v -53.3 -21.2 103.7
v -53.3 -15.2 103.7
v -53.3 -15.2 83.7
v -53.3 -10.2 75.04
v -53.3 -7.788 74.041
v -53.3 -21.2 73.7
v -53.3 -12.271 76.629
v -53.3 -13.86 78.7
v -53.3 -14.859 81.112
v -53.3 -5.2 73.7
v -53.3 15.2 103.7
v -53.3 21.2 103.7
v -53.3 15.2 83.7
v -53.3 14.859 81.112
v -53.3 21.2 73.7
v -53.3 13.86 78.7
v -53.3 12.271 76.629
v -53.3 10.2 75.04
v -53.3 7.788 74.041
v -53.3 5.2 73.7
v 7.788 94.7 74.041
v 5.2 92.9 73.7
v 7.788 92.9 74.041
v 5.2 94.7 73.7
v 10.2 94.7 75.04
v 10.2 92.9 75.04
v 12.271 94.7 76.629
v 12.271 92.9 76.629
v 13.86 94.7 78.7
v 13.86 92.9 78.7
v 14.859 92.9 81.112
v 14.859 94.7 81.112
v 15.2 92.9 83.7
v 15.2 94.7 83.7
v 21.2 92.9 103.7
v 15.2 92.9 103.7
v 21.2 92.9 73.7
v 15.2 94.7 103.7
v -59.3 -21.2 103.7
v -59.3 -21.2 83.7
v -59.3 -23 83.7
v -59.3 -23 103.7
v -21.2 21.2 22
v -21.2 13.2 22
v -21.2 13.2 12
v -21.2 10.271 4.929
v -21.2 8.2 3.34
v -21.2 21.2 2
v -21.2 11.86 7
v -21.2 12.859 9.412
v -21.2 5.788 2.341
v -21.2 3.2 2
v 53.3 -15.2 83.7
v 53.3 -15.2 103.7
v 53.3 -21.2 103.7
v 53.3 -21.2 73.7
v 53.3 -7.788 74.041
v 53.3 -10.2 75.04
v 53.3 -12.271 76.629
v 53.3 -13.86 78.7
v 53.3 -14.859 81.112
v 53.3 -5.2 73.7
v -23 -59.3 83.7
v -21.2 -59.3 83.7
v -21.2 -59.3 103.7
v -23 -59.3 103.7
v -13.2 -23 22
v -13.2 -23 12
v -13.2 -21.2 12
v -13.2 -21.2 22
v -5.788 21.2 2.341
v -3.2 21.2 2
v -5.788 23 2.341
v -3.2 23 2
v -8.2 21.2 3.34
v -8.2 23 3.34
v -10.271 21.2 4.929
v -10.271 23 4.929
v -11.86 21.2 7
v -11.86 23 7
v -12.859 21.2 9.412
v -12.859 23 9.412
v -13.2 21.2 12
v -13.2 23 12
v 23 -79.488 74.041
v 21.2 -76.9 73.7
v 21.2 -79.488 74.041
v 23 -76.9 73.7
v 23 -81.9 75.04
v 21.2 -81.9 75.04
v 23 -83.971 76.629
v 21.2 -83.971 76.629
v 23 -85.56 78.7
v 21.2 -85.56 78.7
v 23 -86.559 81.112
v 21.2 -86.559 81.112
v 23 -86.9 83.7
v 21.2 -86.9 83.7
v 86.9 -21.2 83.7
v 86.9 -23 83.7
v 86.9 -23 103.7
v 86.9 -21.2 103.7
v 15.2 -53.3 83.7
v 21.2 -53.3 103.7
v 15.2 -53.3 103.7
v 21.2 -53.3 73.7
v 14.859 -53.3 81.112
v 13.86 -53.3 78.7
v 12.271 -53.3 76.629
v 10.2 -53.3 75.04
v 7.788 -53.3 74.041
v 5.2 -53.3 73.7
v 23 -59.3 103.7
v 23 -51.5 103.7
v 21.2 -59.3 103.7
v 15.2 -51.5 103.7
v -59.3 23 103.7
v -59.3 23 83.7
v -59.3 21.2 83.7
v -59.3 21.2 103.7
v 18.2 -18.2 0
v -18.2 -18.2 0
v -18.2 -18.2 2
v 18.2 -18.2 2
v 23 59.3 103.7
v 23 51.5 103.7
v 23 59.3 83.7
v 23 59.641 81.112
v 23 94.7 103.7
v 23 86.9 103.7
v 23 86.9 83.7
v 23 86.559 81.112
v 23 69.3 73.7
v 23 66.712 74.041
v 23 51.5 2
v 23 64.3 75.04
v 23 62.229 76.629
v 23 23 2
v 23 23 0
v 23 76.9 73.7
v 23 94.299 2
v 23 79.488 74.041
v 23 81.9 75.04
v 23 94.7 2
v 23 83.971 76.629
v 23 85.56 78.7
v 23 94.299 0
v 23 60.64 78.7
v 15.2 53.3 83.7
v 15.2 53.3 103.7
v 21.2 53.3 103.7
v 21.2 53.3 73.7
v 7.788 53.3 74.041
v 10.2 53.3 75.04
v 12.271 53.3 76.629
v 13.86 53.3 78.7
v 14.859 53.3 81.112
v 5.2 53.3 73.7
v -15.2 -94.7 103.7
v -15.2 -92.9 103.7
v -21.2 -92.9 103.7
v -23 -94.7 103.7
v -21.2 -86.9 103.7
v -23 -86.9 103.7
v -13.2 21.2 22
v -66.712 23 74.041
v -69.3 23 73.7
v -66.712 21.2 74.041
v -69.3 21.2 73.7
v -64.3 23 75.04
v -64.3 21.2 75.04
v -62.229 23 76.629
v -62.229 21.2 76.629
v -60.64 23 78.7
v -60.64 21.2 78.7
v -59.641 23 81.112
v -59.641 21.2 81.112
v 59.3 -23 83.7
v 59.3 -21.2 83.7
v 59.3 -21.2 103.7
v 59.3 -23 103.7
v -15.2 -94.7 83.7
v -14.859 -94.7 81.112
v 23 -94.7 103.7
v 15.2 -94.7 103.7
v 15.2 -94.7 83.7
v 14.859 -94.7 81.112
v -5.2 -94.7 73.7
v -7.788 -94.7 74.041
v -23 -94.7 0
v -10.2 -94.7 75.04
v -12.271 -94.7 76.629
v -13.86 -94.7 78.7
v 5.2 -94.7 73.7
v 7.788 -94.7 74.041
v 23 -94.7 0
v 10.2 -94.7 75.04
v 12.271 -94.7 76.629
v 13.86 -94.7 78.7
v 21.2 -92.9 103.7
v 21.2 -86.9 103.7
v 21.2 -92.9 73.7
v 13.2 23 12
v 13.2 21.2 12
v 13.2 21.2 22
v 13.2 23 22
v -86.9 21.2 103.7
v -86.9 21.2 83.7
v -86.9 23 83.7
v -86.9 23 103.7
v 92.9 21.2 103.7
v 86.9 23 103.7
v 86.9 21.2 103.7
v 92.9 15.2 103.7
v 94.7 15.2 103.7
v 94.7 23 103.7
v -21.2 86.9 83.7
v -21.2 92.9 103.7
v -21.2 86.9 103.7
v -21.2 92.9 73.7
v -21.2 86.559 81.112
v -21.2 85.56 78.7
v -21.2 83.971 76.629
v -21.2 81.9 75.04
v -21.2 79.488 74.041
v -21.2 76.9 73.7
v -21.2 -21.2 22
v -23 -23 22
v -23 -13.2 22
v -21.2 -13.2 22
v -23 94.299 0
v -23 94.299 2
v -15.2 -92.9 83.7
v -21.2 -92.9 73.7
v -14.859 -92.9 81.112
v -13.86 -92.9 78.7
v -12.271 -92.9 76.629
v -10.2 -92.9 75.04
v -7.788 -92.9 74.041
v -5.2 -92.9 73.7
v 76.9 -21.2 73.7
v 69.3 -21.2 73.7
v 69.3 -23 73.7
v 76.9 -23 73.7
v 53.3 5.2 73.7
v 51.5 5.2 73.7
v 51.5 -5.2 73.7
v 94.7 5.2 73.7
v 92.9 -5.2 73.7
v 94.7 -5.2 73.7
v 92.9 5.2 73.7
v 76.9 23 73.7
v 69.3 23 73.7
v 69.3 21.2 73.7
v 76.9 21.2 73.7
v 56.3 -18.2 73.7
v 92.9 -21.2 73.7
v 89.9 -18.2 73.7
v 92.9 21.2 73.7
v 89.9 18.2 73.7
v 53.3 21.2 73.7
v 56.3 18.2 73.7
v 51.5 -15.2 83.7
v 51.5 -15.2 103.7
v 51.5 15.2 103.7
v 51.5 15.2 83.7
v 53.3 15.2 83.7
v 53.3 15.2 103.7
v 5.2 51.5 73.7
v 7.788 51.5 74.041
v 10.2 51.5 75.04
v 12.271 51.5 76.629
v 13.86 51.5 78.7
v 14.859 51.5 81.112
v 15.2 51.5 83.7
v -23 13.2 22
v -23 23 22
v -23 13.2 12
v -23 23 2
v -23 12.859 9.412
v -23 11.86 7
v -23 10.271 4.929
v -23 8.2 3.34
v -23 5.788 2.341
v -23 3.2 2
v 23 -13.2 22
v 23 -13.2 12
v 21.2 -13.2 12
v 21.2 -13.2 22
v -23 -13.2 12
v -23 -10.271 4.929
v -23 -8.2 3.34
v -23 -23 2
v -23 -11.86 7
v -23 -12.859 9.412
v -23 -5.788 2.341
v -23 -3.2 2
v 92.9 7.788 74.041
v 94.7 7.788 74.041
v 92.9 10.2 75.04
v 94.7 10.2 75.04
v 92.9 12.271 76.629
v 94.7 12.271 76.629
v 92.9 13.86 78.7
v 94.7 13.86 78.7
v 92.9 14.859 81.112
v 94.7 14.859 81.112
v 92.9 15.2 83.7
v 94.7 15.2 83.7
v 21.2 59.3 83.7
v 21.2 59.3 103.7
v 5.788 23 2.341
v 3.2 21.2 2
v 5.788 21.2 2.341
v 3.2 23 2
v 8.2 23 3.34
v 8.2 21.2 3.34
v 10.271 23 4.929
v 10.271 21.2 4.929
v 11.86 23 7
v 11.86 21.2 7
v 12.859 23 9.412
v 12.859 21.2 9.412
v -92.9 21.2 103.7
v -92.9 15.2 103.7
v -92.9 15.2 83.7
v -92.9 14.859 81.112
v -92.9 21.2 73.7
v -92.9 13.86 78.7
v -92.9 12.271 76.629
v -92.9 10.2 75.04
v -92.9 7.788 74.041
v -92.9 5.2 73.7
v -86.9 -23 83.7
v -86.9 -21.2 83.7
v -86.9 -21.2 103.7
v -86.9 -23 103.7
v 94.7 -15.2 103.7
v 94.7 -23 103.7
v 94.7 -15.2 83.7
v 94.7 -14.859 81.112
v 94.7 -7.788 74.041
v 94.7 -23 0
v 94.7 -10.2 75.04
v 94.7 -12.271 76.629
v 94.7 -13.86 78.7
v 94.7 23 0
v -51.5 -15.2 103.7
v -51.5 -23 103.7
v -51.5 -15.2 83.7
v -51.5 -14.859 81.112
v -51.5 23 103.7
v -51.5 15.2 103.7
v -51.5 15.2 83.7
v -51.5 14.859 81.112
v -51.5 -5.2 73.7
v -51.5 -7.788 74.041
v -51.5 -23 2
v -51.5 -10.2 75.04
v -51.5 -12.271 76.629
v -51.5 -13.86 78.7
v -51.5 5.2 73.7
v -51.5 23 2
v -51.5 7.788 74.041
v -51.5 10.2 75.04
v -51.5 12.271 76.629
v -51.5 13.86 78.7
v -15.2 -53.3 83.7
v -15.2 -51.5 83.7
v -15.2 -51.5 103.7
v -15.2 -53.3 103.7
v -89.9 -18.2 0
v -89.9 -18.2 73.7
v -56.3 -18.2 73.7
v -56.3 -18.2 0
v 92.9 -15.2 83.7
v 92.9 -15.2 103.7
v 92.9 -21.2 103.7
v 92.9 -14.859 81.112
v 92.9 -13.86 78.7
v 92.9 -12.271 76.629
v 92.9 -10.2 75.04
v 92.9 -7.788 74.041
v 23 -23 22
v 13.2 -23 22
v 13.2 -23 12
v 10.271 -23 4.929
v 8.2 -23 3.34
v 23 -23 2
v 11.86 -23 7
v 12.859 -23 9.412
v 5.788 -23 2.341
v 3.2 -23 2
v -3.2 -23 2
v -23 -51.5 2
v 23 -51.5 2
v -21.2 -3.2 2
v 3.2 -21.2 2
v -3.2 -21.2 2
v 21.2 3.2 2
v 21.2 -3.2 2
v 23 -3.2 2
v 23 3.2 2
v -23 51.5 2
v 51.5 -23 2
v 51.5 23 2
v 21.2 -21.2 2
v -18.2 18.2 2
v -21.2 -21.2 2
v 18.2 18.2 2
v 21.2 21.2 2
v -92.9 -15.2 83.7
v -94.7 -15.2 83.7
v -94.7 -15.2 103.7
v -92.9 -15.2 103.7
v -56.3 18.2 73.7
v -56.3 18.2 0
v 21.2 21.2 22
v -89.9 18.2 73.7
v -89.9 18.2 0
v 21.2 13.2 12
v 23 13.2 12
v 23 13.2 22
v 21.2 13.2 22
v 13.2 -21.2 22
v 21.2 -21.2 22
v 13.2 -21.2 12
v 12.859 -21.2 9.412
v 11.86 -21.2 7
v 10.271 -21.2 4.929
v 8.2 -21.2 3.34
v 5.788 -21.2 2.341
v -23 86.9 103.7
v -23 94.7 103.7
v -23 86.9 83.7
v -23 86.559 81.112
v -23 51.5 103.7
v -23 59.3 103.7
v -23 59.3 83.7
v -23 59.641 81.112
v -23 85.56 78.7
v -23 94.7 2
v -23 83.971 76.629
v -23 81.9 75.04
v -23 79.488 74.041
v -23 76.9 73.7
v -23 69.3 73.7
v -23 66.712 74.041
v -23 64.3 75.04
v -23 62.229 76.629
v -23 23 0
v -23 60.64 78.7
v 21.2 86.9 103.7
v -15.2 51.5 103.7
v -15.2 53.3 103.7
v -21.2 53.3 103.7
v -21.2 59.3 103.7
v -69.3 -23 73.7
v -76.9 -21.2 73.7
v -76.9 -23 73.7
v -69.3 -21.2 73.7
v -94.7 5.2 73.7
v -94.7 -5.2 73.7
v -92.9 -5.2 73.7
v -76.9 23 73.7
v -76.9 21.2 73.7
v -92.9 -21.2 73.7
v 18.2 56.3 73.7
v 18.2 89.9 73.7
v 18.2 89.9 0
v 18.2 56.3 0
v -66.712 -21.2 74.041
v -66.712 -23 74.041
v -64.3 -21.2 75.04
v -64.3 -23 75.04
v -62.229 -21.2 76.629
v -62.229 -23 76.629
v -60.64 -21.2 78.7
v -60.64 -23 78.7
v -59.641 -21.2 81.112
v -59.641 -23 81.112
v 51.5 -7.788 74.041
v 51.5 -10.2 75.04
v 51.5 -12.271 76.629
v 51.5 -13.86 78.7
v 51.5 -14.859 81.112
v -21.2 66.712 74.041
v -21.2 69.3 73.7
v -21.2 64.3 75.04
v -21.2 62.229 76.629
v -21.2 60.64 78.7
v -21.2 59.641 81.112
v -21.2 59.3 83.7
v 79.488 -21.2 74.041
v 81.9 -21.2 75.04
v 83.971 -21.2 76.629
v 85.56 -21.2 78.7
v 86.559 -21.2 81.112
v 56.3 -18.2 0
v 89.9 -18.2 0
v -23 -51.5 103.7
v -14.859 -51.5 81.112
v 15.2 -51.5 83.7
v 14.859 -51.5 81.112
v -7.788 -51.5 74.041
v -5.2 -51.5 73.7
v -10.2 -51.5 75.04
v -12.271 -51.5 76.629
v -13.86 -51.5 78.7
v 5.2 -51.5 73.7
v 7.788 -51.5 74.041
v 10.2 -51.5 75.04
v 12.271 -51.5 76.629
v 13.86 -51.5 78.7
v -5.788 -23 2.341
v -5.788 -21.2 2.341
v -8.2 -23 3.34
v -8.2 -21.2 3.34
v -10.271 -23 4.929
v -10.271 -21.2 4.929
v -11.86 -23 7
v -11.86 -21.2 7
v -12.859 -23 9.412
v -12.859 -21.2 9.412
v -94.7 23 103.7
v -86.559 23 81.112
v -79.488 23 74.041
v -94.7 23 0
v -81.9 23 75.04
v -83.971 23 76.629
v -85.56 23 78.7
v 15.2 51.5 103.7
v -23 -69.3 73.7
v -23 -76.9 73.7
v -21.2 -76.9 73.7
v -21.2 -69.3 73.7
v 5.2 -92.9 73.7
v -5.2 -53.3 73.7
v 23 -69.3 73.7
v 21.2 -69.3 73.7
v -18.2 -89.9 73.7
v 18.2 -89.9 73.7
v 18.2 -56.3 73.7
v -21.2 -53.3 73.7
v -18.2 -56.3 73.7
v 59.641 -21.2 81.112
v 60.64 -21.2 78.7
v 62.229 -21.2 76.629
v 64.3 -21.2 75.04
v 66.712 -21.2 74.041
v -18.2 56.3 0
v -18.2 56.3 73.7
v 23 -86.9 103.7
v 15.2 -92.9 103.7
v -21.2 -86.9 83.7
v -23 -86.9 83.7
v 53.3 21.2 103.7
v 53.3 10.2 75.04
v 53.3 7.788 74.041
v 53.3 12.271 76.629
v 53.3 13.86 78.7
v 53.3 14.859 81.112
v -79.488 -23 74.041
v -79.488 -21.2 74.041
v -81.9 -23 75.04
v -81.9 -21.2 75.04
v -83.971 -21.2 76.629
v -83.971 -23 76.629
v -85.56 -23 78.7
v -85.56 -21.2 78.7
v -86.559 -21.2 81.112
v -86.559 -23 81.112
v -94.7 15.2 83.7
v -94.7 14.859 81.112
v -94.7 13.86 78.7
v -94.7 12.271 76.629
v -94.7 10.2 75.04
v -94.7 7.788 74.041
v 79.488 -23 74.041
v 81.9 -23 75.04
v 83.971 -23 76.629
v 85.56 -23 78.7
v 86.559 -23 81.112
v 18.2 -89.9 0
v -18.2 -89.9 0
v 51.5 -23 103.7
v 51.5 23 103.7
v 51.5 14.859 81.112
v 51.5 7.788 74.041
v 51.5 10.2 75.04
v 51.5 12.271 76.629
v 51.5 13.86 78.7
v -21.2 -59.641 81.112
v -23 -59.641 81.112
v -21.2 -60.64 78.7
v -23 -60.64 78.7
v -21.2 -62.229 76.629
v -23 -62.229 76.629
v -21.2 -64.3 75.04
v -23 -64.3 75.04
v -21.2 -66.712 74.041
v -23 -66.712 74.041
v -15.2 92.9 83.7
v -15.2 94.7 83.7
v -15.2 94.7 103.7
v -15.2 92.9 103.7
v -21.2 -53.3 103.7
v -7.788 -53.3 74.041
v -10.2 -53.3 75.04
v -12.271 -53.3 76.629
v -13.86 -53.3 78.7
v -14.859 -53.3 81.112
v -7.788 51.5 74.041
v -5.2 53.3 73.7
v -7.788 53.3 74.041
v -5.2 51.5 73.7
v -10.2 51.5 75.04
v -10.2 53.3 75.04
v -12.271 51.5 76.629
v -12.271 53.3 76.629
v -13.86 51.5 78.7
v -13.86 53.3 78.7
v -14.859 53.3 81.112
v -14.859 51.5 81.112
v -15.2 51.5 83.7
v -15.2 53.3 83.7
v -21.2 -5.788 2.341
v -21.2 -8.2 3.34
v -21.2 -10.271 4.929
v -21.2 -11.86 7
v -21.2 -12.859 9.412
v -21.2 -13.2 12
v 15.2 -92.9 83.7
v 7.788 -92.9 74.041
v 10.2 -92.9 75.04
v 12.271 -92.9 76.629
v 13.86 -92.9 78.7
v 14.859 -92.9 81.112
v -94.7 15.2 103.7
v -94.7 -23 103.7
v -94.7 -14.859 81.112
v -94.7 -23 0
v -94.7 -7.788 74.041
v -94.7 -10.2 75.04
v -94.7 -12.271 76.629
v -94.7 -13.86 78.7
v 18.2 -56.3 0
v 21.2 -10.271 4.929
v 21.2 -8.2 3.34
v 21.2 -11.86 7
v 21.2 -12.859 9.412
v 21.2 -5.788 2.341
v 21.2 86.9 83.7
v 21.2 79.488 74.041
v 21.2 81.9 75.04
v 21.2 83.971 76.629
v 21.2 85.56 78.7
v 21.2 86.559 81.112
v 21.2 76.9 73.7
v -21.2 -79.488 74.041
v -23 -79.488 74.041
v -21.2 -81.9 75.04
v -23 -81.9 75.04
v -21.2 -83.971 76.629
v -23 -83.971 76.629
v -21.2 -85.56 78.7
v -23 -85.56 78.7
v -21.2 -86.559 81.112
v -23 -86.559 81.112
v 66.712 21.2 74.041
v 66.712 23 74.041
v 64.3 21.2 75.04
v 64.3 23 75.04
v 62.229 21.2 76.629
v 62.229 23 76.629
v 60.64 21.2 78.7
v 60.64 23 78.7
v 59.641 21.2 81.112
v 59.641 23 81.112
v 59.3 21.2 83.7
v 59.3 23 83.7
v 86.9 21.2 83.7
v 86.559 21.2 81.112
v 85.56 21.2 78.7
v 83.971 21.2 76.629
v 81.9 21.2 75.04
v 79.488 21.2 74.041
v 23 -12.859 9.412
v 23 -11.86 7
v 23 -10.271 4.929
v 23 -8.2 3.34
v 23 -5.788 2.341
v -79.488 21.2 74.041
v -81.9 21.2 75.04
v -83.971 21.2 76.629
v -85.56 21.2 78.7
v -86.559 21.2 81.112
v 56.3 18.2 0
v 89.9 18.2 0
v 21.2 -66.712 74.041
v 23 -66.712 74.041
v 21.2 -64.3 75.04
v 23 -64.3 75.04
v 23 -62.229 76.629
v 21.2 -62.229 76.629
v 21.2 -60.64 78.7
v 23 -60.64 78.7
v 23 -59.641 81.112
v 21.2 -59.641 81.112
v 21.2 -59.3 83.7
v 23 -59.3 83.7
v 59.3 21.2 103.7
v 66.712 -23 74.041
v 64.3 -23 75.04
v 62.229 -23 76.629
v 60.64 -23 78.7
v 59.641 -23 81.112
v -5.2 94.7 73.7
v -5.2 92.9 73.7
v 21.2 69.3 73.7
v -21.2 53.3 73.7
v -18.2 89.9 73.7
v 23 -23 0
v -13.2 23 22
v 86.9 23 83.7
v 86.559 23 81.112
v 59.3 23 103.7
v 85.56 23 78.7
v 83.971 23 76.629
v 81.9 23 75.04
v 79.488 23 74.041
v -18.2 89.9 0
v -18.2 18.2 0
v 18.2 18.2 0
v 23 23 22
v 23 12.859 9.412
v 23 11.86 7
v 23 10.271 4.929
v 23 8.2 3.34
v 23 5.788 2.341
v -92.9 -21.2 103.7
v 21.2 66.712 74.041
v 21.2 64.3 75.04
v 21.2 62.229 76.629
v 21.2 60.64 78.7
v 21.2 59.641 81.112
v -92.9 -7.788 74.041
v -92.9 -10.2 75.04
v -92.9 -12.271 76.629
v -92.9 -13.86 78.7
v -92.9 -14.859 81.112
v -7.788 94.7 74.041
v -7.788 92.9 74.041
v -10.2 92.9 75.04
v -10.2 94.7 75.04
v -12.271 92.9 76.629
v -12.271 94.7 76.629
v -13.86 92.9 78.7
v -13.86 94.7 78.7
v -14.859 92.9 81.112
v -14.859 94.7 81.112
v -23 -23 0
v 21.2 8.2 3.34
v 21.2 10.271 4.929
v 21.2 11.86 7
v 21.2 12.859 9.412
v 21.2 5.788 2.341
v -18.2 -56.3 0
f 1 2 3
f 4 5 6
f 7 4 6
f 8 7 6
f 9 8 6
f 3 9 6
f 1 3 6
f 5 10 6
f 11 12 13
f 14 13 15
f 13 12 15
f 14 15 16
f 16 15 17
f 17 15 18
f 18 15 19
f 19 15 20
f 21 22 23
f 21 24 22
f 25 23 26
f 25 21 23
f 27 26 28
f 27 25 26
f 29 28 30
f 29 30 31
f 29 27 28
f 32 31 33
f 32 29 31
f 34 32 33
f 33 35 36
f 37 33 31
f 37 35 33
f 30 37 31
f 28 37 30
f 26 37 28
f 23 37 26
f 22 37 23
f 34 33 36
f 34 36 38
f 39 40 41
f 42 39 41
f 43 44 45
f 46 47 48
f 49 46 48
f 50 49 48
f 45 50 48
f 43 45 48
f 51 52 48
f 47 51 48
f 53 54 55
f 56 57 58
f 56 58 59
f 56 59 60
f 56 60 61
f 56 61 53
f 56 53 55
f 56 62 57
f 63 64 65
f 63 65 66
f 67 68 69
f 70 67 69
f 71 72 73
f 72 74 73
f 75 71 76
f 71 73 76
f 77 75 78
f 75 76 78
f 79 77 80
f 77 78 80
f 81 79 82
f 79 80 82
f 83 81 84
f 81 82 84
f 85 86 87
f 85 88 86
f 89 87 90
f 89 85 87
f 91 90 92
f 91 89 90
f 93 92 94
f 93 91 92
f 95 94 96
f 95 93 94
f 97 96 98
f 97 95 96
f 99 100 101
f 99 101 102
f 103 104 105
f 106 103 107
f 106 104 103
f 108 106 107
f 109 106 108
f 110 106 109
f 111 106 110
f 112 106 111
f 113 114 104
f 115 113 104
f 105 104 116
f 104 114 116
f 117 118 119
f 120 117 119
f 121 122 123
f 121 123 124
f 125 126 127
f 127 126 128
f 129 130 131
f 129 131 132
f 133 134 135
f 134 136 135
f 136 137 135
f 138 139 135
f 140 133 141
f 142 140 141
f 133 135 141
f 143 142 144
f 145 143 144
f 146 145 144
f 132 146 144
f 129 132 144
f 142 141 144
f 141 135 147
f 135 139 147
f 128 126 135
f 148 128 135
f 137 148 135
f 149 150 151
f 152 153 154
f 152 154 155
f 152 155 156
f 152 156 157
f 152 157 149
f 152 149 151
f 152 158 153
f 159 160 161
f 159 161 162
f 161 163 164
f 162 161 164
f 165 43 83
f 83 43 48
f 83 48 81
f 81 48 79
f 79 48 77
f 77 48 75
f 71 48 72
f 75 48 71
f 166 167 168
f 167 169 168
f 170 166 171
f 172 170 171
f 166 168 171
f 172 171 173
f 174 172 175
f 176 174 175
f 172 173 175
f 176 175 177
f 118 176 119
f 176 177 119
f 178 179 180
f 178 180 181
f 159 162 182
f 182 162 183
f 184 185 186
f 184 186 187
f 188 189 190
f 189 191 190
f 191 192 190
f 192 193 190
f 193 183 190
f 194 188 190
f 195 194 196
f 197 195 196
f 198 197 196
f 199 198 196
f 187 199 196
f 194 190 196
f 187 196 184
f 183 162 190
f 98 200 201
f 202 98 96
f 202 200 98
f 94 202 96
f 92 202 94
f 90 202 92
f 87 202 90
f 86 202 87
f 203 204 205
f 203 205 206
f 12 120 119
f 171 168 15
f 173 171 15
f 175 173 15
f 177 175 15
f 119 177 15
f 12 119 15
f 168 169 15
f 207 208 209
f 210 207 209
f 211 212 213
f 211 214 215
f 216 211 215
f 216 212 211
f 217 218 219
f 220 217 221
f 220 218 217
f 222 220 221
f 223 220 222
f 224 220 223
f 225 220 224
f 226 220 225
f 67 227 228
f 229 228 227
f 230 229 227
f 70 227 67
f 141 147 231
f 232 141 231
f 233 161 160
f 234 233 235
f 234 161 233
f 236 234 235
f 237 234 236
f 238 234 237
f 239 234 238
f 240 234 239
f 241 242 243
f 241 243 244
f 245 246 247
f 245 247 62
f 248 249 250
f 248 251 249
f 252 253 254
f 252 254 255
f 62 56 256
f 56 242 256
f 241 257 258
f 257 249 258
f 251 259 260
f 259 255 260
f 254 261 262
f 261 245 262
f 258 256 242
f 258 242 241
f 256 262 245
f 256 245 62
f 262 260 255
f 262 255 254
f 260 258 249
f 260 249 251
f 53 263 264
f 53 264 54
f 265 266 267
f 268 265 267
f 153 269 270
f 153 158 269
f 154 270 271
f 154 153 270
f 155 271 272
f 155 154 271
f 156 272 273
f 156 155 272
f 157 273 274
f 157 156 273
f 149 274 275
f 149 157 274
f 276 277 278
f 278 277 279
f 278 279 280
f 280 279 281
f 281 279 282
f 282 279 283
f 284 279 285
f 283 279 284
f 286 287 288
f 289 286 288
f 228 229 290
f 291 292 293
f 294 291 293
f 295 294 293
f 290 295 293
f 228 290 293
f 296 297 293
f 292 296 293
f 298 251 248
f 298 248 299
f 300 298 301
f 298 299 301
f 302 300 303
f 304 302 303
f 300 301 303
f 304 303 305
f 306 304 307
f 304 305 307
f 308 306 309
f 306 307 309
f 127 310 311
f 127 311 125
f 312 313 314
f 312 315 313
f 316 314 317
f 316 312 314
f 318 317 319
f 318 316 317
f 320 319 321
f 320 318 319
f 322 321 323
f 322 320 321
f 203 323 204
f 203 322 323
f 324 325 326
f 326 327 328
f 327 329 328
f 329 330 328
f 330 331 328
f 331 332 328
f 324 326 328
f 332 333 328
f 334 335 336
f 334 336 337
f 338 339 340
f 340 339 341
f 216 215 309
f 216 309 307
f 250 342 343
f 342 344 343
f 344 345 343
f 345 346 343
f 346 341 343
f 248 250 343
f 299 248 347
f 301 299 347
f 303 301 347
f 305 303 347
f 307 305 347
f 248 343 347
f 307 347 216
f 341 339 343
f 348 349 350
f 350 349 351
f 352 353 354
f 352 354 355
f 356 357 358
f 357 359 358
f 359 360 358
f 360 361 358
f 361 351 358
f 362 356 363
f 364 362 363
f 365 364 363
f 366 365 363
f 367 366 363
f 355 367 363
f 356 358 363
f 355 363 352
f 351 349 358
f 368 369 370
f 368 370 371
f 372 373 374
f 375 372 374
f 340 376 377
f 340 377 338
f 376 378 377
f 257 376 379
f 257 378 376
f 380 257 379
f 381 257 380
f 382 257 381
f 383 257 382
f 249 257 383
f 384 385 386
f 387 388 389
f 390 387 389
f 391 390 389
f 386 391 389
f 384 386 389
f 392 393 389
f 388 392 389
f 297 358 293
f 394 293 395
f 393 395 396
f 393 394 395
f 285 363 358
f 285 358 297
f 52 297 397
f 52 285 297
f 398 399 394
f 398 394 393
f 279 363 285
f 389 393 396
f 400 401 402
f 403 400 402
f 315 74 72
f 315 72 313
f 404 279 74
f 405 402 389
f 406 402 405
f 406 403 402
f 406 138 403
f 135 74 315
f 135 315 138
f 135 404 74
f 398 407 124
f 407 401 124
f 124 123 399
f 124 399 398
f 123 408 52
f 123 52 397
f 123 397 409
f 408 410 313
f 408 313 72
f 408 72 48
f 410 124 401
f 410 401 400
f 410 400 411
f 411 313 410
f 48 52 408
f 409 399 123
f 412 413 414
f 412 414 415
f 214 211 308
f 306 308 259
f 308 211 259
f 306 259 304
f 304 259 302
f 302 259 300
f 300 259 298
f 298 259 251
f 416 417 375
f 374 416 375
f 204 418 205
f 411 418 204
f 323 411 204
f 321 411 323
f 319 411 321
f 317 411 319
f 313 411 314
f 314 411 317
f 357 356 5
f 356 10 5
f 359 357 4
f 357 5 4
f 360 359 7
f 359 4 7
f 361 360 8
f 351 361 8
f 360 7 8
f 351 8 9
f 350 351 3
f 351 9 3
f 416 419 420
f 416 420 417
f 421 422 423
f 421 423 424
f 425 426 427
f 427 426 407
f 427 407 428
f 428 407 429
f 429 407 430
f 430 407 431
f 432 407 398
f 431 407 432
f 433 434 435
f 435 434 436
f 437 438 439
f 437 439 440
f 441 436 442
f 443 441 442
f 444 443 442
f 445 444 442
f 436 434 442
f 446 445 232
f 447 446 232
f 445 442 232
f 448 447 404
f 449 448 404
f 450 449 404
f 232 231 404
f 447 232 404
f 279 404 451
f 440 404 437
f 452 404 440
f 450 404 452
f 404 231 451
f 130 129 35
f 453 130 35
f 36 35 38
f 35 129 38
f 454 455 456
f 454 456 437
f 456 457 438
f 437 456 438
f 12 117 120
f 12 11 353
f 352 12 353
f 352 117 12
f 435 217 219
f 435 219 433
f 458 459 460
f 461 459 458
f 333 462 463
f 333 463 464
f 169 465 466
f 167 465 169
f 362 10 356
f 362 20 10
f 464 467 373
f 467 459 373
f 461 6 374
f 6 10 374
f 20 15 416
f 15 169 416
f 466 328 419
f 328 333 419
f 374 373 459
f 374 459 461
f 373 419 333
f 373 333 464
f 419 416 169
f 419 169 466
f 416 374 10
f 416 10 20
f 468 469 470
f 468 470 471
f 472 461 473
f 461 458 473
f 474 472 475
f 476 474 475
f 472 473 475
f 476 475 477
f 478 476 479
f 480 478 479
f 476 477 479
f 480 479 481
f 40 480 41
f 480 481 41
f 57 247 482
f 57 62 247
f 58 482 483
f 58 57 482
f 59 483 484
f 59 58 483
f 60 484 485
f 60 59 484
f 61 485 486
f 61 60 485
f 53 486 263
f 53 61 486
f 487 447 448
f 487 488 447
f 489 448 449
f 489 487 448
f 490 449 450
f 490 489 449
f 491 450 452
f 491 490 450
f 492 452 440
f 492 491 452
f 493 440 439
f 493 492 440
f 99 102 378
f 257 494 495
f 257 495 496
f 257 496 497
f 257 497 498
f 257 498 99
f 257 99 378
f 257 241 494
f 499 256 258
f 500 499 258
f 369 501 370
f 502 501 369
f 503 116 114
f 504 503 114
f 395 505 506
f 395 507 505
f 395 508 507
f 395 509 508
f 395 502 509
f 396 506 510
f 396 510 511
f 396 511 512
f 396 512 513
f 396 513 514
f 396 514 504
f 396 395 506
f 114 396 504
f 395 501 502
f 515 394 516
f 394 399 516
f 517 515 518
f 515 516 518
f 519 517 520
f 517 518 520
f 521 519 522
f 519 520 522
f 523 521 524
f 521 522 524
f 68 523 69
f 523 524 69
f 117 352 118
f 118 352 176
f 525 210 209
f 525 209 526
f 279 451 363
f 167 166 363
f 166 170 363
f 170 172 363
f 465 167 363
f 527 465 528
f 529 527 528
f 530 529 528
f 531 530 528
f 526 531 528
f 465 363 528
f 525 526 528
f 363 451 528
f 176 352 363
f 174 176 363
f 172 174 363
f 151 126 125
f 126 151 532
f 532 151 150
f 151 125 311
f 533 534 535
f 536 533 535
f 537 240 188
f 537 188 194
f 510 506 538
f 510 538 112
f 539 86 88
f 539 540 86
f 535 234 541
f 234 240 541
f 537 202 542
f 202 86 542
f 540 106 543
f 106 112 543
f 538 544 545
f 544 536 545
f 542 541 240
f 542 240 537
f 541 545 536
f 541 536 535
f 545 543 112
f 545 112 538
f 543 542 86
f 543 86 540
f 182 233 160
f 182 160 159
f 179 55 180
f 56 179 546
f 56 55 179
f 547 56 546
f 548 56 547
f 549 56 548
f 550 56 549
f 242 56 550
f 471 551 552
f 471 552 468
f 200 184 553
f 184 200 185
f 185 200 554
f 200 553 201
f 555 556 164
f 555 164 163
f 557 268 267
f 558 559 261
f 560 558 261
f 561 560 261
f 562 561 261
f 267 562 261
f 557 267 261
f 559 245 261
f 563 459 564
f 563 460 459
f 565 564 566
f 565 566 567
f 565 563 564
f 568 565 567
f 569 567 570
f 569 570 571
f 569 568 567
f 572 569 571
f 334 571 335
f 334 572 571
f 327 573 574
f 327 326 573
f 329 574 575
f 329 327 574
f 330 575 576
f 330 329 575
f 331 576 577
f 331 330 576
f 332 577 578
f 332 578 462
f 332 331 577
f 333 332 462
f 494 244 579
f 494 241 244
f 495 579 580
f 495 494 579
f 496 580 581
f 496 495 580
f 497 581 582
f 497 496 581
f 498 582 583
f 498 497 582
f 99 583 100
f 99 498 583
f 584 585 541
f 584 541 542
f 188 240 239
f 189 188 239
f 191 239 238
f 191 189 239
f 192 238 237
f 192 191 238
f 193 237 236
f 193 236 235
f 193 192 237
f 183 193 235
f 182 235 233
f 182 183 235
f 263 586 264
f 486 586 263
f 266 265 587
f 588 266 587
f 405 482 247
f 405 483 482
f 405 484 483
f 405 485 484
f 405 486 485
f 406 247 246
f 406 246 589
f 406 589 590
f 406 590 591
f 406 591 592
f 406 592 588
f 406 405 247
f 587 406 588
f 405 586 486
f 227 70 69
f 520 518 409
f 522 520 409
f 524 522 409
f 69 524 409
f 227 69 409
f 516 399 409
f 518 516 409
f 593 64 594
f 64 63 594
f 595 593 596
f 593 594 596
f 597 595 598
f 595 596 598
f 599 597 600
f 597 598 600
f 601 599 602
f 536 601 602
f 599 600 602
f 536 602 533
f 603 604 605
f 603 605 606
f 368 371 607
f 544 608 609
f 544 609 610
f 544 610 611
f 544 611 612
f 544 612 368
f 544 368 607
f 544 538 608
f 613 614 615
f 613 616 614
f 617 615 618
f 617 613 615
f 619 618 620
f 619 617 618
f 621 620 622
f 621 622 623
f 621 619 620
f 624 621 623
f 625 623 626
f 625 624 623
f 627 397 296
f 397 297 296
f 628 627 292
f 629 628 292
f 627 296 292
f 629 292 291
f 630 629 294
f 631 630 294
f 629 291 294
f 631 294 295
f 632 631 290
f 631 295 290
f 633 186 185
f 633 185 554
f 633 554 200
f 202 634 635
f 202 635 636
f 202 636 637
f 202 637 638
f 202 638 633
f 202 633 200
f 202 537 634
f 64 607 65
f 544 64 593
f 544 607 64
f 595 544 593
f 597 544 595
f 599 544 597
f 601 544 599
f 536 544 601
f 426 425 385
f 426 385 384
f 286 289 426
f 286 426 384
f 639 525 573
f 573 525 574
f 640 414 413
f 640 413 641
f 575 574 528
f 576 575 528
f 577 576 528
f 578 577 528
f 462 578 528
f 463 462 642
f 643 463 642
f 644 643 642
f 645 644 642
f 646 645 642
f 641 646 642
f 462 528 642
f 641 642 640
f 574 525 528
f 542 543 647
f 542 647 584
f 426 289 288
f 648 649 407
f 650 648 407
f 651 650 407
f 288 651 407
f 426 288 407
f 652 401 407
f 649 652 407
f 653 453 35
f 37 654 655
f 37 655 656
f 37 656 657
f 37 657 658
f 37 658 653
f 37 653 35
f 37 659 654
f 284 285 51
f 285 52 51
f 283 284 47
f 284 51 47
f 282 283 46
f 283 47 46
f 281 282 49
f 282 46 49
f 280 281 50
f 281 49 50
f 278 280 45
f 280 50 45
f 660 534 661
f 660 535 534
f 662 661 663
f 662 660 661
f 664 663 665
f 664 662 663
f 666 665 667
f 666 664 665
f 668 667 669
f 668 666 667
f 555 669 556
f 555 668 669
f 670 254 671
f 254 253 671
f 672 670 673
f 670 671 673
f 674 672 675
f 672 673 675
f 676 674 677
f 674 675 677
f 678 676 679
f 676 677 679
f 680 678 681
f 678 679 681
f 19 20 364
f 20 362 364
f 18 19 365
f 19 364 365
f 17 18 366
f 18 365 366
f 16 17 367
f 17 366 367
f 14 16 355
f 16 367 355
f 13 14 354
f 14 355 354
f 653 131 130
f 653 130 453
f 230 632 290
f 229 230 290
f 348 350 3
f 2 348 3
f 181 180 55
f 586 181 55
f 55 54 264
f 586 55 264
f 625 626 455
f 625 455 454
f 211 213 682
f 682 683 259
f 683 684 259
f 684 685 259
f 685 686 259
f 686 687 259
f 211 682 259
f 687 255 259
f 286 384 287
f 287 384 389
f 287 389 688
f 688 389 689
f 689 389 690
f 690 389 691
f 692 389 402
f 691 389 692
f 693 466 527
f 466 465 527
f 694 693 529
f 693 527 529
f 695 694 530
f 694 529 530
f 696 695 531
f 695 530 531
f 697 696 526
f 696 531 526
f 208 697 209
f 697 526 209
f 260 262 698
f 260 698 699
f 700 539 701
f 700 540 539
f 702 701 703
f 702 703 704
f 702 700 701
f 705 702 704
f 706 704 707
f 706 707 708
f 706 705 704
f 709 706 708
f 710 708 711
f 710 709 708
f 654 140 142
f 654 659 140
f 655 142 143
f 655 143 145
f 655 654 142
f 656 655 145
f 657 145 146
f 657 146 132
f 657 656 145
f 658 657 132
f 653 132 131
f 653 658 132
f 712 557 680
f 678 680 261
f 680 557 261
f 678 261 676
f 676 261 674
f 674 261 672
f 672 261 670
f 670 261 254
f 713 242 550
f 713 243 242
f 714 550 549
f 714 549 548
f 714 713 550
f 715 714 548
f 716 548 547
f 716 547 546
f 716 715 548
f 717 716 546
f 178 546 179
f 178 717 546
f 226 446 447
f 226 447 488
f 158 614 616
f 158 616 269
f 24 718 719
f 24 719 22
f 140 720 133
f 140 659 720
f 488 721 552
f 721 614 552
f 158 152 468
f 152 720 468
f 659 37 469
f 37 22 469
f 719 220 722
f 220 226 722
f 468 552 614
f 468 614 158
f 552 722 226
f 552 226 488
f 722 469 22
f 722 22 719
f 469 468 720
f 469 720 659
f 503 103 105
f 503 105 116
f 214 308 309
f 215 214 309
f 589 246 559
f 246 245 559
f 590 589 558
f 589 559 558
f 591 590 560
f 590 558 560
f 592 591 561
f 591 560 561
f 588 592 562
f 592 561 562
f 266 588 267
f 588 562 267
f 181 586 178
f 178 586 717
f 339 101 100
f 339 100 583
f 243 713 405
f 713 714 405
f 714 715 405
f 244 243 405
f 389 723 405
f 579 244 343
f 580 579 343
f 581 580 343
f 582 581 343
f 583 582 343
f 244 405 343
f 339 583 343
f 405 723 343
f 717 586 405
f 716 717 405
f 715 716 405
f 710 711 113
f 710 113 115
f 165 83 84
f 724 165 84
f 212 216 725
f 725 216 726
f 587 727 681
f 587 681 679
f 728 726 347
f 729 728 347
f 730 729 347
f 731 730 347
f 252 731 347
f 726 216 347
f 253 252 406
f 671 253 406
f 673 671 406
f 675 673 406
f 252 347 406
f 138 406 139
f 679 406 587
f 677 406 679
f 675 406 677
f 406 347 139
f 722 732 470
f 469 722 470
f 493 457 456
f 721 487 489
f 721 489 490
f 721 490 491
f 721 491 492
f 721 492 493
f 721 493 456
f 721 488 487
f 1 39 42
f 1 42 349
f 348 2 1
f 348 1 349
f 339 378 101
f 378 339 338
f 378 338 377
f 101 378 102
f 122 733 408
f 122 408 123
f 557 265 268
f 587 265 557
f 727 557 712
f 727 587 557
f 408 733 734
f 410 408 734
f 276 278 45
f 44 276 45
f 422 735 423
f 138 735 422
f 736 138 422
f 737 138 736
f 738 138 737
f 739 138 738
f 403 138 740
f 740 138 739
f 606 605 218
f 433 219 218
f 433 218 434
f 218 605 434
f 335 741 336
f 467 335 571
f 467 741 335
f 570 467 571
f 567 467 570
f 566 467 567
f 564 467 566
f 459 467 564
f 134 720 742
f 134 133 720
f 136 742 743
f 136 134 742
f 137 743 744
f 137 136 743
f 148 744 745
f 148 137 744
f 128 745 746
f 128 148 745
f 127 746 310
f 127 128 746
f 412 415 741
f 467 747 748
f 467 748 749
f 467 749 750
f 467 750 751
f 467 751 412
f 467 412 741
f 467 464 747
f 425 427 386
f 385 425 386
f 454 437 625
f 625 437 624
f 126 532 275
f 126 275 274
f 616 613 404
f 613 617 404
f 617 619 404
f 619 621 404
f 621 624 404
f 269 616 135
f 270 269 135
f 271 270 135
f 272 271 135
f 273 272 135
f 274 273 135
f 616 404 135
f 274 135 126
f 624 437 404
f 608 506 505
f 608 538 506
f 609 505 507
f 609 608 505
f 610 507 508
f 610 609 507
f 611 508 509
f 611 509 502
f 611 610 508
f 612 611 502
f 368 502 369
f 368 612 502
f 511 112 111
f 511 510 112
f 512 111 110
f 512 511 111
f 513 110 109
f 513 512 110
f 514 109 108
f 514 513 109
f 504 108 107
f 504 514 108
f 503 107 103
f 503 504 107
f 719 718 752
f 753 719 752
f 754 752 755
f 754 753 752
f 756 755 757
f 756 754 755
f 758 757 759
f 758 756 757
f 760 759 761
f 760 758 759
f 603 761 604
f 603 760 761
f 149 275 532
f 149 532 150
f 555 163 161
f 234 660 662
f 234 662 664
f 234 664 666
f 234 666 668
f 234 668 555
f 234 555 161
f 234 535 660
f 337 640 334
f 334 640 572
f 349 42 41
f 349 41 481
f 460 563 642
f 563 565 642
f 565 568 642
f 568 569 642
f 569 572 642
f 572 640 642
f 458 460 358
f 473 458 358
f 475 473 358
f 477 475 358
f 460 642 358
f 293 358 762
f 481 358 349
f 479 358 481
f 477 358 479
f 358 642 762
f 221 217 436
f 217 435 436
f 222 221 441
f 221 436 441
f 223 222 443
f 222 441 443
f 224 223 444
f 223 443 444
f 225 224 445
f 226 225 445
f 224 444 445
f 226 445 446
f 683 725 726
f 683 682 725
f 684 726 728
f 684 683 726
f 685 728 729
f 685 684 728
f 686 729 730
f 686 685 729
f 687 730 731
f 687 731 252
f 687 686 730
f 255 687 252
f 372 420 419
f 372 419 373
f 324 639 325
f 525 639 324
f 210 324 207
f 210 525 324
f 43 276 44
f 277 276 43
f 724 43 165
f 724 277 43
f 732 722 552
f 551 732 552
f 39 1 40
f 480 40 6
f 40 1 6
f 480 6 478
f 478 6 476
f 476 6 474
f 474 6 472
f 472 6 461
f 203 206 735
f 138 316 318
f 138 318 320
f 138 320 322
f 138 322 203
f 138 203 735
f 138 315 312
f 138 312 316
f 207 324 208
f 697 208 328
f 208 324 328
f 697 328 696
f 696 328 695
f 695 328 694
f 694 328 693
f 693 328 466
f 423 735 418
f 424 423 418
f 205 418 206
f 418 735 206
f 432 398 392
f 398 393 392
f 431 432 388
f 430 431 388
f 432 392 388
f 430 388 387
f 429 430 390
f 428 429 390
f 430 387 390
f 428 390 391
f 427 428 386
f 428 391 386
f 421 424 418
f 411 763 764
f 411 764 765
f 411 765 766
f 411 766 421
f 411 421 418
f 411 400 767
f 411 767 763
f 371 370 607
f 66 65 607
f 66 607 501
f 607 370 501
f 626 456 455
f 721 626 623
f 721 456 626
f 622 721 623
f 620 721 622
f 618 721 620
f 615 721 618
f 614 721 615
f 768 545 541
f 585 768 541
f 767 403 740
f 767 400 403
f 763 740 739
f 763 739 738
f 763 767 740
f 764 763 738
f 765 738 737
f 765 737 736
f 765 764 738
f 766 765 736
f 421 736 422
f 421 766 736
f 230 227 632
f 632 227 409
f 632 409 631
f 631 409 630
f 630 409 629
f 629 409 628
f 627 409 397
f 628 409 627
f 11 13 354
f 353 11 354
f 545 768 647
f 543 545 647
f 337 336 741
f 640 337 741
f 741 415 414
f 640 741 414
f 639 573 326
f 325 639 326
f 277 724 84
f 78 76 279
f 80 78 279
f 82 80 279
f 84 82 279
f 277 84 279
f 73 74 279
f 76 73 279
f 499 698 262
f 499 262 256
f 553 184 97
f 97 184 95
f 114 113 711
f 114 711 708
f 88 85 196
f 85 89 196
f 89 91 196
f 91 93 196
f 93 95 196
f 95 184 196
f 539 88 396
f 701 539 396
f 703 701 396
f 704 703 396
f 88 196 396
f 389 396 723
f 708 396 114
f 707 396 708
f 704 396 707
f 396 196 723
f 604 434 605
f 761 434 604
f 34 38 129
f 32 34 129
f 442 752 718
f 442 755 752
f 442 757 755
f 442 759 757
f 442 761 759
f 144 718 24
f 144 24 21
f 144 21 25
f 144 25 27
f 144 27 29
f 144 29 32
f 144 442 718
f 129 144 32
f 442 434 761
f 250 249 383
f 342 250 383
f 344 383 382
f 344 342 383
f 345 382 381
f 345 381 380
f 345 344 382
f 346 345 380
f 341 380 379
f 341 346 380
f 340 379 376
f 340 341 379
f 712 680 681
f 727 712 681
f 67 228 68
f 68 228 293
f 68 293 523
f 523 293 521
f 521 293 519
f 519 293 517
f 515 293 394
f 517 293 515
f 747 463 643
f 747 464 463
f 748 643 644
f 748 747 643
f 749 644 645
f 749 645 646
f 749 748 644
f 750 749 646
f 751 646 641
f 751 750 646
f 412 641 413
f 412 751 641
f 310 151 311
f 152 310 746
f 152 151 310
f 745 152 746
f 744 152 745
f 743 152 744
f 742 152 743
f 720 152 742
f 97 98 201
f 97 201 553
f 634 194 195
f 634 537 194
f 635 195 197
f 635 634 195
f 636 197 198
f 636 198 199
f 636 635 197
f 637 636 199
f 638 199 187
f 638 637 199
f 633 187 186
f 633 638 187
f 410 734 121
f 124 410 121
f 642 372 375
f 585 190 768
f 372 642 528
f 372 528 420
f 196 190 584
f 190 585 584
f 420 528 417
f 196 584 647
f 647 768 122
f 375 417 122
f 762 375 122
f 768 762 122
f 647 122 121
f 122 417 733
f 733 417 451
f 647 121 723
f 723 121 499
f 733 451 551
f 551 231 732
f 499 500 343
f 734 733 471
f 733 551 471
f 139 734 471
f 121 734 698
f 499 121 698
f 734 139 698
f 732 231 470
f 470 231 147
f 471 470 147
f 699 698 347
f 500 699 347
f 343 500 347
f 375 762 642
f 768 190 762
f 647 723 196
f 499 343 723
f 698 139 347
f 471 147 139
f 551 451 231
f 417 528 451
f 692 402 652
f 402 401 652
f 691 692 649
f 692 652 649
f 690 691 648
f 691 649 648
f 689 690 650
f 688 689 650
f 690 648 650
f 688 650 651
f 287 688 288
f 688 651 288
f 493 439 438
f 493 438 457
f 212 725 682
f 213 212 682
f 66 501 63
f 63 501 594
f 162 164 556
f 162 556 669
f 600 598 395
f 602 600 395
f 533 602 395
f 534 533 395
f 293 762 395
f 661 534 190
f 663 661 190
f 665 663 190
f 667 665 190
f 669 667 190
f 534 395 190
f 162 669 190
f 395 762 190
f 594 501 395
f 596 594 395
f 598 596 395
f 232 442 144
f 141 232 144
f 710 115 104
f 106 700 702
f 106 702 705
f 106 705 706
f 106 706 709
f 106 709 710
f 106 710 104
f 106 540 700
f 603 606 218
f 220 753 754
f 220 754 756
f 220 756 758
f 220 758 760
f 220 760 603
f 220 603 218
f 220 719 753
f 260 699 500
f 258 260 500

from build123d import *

# Parameters (mm, degrees)
PAD_DEPTH     = 2
SKETCH001_W   = 43.2
SKETCH001_H   = 46
SKETCH001_W_2 = 46
SKETCH001_H_2 = 43.2
PAD001_DEPTH  = 71.7
PAD002_DEPTH  = 20
PAD003_DEPTH  = 30
SKETCH004_W   = 36.4
SKETCH004_H   = 33.6
SKETCH004_W_2 = 33.6
SKETCH004_H_2 = 36.4
POCKET_DEPTH  = 103.701
FILLET_R      = 10


with BuildPart() as part:
    # Sketch → Pad (new body)
    with BuildSketch(Plane.XY):
        Polygon((-51.5, 23), (-94.7, 23), (-94.7, -23), (-51.5, -23), (-23, -23), (-23, -51.5), (-23, -94.7), (23, -94.7), (23, -51.5), (23, -23), (51.5, -23), (94.7, -23), (94.7, 23), (51.5, 23), (23, 23), (23, 51.5), (23, 94.298633), (-23, 94.298633), (-23, 51.098633), (-23, 23), align=None)
    extrude(amount=PAD_DEPTH)

    # Sketch001 → Pad001 (new body)
    with BuildSketch(Plane.XY.offset(2)):
        with Locations((-73.1, 0)):
            Rectangle(SKETCH001_W, SKETCH001_H)
        with Locations((73.1, 0)):
            Rectangle(SKETCH001_W, SKETCH001_H)
        with Locations((0, 73.1)):
            Rectangle(SKETCH001_W_2, SKETCH001_H_2)
        with Locations((0, -73.1)):
            Rectangle(SKETCH001_W_2, SKETCH001_H_2)
    extrude(amount=PAD001_DEPTH)

    # Sketch002 → Pad002 (new body)
    with BuildSketch(Plane.XY.offset(2)):
        Polygon((-23, 23), (-23, 13.2), (-21.2, 13.2), (-21.2, 21.2), (-13.2, 21.2), (-13.2, 23), align=None)
        Polygon((21.2, 21.2), (13.2, 21.2), (13.2, 23), (23, 23), (23, 13.2), (21.2, 13.2), align=None)
        Polygon((23, -23), (23, -13.2), (21.2, -13.2), (21.2, -21.2), (13.2, -21.2), (13.2, -23), align=None)
        Polygon((-21.2, -21.2), (-21.2, -13.2), (-23, -13.2), (-23, -23), (-13.2, -23), (-13.2, -21.2), align=None)
    extrude(amount=PAD002_DEPTH)

    # Sketch003 → Pad003 (new body)
    with BuildSketch(Plane.XY.offset(73.7)):
        Polygon((-94.7, 23), (-94.7, 15.2), (-92.9, 15.2), (-92.9, 21.2), (-86.9, 21.2), (-86.9, 23), align=None)
        Polygon((-51.5, 23), (-59.3, 23), (-59.3, 21.2), (-53.3, 21.2), (-53.3, 15.2), (-51.5, 15.2), align=None)
        Polygon((-92.9, -15.2), (-92.9, -21.2), (-86.9, -21.2), (-86.9, -23), (-94.7, -23), (-94.7, -15.2), align=None)
        Polygon((-51.5, -23), (-51.5, -15.2), (-53.3, -15.2), (-53.3, -21.2), (-59.3, -21.2), (-59.3, -23), align=None)
        Polygon((-23, -59.3), (-23, -51.5), (-15.2, -51.5), (-15.2, -53.3), (-21.2, -53.3), (-21.2, -59.3), align=None)
        Polygon((-23, -94.7), (-23, -86.9), (-21.2, -86.9), (-21.2, -92.9), (-15.2, -92.9), (-15.2, -94.7), align=None)
        Polygon((15.2, -51.5), (23, -51.5), (23, -59.3), (21.2, -59.3), (21.2, -53.3), (15.2, -53.3), align=None)
        Polygon((23, -94.7), (15.2, -94.7), (15.2, -92.9), (21.2, -92.9), (21.2, -86.9), (23, -86.9), align=None)
        Polygon((51.5, 23), (51.5, 15.2), (53.3, 15.2), (53.3, 21.2), (59.3, 21.2), (59.3, 23), align=None)
        Polygon((94.7, 23), (86.9, 23), (86.9, 21.2), (92.9, 21.2), (92.9, 15.2), (94.7, 15.2), align=None)
        Polygon((51.5, -23), (51.5, -15.2), (53.3, -15.2), (53.3, -21.2), (59.3, -21.2), (59.3, -23), align=None)
        Polygon((94.7, -23), (86.9, -23), (86.9, -21.2), (92.9, -21.2), (92.9, -15.2), (94.7, -15.2), align=None)
        Polygon((-23, 51.5), (-23, 59.3), (-21.2, 59.3), (-21.2, 53.3), (-15.2, 53.3), (-15.2, 51.5), align=None)
        Polygon((15.2, 51.5), (15.2, 53.3), (21.2, 53.3), (21.2, 59.3), (23, 59.3), (23, 51.5), align=None)
        Polygon((15.2, 94.7), (23, 94.7), (23, 86.9), (21.2, 86.9), (21.2, 92.9), (15.2, 92.9), align=None)
        Polygon((-15.2, 94.7), (-15.2, 92.9), (-21.2, 92.9), (-21.2, 86.9), (-23, 86.9), (-23, 94.7), align=None)
    extrude(amount=PAD003_DEPTH)

    # Sketch004 → Pocket (cut, through all)
    with BuildSketch(Plane(origin=(0, 0, 0), x_dir=(1, 0, 0), z_dir=(0, 0, -1))):
        with Locations((0, 73.1)):
            Rectangle(SKETCH004_W, SKETCH004_H)
        with Locations((0, -73.1)):
            Rectangle(SKETCH004_W, SKETCH004_H)
        with Locations((-73.1, 0)):
            Rectangle(SKETCH004_W_2, SKETCH004_H_2)
        with Locations((73.1, 0)):
            Rectangle(SKETCH004_W_2, SKETCH004_H_2)
        Rectangle(SKETCH004_W, SKETCH004_H_2)
    extrude(amount=-POCKET_DEPTH, mode=Mode.SUBTRACT)

    # Fillet
    fillet_edges = [part.edges().sort_by_distance(p)[0] for p in [
        (15.2, 93.8, 73.7),
        (15.2, 52.4, 73.7),
        (15.2, -52.4, 73.7),
        (15.2, -93.8, 73.7),
        (86.9, -22.1, 73.7),
        (86.9, 22.1, 73.7),
        (-59.3, -22.1, 73.7),
        (-59.3, 22.1, 73.7),
        (22.1, 59.3, 73.7),
        (-22.1, 59.3, 73.7),
        (-93.8, -15.2, 73.7),
        (-52.4, -15.2, 73.7),
        (-22.1, -86.9, 73.7),
        (22.1, -86.9, 73.7),
        (52.4, -15.2, 73.7),
        (93.8, -15.2, 73.7),
        (-15.2, -93.8, 73.7),
        (-15.2, -52.4, 73.7),
        (-86.9, -22.1, 73.7),
        (-86.9, 22.1, 73.7),
        (-15.2, 52.4, 73.7),
        (-15.2, 93.8, 73.7),
        (59.3, 22.1, 73.7),
        (59.3, -22.1, 73.7),
        (-22.1, 86.9, 73.7),
        (22.1, 86.9, 73.7),
        (52.4, 15.2, 73.7),
        (93.8, 15.2, 73.7),
        (22.1, -59.3, 73.7),
        (-22.1, -59.3, 73.7),
        (-52.4, 15.2, 73.7),
        (-93.8, 15.2, 73.7),
        (13.2, -22.1, 2),
        (22.1, -13.2, 2),
        (22.1, 13.2, 2),
        (-22.1, 13.2, 2),
        (13.2, 22.1, 2),
        (-13.2, 22.1, 2),
        (-13.2, -22.1, 2),
        (-22.1, -13.2, 2),
    ]]
    fillet(fillet_edges, radius=FILLET_R)


solid = part.part
